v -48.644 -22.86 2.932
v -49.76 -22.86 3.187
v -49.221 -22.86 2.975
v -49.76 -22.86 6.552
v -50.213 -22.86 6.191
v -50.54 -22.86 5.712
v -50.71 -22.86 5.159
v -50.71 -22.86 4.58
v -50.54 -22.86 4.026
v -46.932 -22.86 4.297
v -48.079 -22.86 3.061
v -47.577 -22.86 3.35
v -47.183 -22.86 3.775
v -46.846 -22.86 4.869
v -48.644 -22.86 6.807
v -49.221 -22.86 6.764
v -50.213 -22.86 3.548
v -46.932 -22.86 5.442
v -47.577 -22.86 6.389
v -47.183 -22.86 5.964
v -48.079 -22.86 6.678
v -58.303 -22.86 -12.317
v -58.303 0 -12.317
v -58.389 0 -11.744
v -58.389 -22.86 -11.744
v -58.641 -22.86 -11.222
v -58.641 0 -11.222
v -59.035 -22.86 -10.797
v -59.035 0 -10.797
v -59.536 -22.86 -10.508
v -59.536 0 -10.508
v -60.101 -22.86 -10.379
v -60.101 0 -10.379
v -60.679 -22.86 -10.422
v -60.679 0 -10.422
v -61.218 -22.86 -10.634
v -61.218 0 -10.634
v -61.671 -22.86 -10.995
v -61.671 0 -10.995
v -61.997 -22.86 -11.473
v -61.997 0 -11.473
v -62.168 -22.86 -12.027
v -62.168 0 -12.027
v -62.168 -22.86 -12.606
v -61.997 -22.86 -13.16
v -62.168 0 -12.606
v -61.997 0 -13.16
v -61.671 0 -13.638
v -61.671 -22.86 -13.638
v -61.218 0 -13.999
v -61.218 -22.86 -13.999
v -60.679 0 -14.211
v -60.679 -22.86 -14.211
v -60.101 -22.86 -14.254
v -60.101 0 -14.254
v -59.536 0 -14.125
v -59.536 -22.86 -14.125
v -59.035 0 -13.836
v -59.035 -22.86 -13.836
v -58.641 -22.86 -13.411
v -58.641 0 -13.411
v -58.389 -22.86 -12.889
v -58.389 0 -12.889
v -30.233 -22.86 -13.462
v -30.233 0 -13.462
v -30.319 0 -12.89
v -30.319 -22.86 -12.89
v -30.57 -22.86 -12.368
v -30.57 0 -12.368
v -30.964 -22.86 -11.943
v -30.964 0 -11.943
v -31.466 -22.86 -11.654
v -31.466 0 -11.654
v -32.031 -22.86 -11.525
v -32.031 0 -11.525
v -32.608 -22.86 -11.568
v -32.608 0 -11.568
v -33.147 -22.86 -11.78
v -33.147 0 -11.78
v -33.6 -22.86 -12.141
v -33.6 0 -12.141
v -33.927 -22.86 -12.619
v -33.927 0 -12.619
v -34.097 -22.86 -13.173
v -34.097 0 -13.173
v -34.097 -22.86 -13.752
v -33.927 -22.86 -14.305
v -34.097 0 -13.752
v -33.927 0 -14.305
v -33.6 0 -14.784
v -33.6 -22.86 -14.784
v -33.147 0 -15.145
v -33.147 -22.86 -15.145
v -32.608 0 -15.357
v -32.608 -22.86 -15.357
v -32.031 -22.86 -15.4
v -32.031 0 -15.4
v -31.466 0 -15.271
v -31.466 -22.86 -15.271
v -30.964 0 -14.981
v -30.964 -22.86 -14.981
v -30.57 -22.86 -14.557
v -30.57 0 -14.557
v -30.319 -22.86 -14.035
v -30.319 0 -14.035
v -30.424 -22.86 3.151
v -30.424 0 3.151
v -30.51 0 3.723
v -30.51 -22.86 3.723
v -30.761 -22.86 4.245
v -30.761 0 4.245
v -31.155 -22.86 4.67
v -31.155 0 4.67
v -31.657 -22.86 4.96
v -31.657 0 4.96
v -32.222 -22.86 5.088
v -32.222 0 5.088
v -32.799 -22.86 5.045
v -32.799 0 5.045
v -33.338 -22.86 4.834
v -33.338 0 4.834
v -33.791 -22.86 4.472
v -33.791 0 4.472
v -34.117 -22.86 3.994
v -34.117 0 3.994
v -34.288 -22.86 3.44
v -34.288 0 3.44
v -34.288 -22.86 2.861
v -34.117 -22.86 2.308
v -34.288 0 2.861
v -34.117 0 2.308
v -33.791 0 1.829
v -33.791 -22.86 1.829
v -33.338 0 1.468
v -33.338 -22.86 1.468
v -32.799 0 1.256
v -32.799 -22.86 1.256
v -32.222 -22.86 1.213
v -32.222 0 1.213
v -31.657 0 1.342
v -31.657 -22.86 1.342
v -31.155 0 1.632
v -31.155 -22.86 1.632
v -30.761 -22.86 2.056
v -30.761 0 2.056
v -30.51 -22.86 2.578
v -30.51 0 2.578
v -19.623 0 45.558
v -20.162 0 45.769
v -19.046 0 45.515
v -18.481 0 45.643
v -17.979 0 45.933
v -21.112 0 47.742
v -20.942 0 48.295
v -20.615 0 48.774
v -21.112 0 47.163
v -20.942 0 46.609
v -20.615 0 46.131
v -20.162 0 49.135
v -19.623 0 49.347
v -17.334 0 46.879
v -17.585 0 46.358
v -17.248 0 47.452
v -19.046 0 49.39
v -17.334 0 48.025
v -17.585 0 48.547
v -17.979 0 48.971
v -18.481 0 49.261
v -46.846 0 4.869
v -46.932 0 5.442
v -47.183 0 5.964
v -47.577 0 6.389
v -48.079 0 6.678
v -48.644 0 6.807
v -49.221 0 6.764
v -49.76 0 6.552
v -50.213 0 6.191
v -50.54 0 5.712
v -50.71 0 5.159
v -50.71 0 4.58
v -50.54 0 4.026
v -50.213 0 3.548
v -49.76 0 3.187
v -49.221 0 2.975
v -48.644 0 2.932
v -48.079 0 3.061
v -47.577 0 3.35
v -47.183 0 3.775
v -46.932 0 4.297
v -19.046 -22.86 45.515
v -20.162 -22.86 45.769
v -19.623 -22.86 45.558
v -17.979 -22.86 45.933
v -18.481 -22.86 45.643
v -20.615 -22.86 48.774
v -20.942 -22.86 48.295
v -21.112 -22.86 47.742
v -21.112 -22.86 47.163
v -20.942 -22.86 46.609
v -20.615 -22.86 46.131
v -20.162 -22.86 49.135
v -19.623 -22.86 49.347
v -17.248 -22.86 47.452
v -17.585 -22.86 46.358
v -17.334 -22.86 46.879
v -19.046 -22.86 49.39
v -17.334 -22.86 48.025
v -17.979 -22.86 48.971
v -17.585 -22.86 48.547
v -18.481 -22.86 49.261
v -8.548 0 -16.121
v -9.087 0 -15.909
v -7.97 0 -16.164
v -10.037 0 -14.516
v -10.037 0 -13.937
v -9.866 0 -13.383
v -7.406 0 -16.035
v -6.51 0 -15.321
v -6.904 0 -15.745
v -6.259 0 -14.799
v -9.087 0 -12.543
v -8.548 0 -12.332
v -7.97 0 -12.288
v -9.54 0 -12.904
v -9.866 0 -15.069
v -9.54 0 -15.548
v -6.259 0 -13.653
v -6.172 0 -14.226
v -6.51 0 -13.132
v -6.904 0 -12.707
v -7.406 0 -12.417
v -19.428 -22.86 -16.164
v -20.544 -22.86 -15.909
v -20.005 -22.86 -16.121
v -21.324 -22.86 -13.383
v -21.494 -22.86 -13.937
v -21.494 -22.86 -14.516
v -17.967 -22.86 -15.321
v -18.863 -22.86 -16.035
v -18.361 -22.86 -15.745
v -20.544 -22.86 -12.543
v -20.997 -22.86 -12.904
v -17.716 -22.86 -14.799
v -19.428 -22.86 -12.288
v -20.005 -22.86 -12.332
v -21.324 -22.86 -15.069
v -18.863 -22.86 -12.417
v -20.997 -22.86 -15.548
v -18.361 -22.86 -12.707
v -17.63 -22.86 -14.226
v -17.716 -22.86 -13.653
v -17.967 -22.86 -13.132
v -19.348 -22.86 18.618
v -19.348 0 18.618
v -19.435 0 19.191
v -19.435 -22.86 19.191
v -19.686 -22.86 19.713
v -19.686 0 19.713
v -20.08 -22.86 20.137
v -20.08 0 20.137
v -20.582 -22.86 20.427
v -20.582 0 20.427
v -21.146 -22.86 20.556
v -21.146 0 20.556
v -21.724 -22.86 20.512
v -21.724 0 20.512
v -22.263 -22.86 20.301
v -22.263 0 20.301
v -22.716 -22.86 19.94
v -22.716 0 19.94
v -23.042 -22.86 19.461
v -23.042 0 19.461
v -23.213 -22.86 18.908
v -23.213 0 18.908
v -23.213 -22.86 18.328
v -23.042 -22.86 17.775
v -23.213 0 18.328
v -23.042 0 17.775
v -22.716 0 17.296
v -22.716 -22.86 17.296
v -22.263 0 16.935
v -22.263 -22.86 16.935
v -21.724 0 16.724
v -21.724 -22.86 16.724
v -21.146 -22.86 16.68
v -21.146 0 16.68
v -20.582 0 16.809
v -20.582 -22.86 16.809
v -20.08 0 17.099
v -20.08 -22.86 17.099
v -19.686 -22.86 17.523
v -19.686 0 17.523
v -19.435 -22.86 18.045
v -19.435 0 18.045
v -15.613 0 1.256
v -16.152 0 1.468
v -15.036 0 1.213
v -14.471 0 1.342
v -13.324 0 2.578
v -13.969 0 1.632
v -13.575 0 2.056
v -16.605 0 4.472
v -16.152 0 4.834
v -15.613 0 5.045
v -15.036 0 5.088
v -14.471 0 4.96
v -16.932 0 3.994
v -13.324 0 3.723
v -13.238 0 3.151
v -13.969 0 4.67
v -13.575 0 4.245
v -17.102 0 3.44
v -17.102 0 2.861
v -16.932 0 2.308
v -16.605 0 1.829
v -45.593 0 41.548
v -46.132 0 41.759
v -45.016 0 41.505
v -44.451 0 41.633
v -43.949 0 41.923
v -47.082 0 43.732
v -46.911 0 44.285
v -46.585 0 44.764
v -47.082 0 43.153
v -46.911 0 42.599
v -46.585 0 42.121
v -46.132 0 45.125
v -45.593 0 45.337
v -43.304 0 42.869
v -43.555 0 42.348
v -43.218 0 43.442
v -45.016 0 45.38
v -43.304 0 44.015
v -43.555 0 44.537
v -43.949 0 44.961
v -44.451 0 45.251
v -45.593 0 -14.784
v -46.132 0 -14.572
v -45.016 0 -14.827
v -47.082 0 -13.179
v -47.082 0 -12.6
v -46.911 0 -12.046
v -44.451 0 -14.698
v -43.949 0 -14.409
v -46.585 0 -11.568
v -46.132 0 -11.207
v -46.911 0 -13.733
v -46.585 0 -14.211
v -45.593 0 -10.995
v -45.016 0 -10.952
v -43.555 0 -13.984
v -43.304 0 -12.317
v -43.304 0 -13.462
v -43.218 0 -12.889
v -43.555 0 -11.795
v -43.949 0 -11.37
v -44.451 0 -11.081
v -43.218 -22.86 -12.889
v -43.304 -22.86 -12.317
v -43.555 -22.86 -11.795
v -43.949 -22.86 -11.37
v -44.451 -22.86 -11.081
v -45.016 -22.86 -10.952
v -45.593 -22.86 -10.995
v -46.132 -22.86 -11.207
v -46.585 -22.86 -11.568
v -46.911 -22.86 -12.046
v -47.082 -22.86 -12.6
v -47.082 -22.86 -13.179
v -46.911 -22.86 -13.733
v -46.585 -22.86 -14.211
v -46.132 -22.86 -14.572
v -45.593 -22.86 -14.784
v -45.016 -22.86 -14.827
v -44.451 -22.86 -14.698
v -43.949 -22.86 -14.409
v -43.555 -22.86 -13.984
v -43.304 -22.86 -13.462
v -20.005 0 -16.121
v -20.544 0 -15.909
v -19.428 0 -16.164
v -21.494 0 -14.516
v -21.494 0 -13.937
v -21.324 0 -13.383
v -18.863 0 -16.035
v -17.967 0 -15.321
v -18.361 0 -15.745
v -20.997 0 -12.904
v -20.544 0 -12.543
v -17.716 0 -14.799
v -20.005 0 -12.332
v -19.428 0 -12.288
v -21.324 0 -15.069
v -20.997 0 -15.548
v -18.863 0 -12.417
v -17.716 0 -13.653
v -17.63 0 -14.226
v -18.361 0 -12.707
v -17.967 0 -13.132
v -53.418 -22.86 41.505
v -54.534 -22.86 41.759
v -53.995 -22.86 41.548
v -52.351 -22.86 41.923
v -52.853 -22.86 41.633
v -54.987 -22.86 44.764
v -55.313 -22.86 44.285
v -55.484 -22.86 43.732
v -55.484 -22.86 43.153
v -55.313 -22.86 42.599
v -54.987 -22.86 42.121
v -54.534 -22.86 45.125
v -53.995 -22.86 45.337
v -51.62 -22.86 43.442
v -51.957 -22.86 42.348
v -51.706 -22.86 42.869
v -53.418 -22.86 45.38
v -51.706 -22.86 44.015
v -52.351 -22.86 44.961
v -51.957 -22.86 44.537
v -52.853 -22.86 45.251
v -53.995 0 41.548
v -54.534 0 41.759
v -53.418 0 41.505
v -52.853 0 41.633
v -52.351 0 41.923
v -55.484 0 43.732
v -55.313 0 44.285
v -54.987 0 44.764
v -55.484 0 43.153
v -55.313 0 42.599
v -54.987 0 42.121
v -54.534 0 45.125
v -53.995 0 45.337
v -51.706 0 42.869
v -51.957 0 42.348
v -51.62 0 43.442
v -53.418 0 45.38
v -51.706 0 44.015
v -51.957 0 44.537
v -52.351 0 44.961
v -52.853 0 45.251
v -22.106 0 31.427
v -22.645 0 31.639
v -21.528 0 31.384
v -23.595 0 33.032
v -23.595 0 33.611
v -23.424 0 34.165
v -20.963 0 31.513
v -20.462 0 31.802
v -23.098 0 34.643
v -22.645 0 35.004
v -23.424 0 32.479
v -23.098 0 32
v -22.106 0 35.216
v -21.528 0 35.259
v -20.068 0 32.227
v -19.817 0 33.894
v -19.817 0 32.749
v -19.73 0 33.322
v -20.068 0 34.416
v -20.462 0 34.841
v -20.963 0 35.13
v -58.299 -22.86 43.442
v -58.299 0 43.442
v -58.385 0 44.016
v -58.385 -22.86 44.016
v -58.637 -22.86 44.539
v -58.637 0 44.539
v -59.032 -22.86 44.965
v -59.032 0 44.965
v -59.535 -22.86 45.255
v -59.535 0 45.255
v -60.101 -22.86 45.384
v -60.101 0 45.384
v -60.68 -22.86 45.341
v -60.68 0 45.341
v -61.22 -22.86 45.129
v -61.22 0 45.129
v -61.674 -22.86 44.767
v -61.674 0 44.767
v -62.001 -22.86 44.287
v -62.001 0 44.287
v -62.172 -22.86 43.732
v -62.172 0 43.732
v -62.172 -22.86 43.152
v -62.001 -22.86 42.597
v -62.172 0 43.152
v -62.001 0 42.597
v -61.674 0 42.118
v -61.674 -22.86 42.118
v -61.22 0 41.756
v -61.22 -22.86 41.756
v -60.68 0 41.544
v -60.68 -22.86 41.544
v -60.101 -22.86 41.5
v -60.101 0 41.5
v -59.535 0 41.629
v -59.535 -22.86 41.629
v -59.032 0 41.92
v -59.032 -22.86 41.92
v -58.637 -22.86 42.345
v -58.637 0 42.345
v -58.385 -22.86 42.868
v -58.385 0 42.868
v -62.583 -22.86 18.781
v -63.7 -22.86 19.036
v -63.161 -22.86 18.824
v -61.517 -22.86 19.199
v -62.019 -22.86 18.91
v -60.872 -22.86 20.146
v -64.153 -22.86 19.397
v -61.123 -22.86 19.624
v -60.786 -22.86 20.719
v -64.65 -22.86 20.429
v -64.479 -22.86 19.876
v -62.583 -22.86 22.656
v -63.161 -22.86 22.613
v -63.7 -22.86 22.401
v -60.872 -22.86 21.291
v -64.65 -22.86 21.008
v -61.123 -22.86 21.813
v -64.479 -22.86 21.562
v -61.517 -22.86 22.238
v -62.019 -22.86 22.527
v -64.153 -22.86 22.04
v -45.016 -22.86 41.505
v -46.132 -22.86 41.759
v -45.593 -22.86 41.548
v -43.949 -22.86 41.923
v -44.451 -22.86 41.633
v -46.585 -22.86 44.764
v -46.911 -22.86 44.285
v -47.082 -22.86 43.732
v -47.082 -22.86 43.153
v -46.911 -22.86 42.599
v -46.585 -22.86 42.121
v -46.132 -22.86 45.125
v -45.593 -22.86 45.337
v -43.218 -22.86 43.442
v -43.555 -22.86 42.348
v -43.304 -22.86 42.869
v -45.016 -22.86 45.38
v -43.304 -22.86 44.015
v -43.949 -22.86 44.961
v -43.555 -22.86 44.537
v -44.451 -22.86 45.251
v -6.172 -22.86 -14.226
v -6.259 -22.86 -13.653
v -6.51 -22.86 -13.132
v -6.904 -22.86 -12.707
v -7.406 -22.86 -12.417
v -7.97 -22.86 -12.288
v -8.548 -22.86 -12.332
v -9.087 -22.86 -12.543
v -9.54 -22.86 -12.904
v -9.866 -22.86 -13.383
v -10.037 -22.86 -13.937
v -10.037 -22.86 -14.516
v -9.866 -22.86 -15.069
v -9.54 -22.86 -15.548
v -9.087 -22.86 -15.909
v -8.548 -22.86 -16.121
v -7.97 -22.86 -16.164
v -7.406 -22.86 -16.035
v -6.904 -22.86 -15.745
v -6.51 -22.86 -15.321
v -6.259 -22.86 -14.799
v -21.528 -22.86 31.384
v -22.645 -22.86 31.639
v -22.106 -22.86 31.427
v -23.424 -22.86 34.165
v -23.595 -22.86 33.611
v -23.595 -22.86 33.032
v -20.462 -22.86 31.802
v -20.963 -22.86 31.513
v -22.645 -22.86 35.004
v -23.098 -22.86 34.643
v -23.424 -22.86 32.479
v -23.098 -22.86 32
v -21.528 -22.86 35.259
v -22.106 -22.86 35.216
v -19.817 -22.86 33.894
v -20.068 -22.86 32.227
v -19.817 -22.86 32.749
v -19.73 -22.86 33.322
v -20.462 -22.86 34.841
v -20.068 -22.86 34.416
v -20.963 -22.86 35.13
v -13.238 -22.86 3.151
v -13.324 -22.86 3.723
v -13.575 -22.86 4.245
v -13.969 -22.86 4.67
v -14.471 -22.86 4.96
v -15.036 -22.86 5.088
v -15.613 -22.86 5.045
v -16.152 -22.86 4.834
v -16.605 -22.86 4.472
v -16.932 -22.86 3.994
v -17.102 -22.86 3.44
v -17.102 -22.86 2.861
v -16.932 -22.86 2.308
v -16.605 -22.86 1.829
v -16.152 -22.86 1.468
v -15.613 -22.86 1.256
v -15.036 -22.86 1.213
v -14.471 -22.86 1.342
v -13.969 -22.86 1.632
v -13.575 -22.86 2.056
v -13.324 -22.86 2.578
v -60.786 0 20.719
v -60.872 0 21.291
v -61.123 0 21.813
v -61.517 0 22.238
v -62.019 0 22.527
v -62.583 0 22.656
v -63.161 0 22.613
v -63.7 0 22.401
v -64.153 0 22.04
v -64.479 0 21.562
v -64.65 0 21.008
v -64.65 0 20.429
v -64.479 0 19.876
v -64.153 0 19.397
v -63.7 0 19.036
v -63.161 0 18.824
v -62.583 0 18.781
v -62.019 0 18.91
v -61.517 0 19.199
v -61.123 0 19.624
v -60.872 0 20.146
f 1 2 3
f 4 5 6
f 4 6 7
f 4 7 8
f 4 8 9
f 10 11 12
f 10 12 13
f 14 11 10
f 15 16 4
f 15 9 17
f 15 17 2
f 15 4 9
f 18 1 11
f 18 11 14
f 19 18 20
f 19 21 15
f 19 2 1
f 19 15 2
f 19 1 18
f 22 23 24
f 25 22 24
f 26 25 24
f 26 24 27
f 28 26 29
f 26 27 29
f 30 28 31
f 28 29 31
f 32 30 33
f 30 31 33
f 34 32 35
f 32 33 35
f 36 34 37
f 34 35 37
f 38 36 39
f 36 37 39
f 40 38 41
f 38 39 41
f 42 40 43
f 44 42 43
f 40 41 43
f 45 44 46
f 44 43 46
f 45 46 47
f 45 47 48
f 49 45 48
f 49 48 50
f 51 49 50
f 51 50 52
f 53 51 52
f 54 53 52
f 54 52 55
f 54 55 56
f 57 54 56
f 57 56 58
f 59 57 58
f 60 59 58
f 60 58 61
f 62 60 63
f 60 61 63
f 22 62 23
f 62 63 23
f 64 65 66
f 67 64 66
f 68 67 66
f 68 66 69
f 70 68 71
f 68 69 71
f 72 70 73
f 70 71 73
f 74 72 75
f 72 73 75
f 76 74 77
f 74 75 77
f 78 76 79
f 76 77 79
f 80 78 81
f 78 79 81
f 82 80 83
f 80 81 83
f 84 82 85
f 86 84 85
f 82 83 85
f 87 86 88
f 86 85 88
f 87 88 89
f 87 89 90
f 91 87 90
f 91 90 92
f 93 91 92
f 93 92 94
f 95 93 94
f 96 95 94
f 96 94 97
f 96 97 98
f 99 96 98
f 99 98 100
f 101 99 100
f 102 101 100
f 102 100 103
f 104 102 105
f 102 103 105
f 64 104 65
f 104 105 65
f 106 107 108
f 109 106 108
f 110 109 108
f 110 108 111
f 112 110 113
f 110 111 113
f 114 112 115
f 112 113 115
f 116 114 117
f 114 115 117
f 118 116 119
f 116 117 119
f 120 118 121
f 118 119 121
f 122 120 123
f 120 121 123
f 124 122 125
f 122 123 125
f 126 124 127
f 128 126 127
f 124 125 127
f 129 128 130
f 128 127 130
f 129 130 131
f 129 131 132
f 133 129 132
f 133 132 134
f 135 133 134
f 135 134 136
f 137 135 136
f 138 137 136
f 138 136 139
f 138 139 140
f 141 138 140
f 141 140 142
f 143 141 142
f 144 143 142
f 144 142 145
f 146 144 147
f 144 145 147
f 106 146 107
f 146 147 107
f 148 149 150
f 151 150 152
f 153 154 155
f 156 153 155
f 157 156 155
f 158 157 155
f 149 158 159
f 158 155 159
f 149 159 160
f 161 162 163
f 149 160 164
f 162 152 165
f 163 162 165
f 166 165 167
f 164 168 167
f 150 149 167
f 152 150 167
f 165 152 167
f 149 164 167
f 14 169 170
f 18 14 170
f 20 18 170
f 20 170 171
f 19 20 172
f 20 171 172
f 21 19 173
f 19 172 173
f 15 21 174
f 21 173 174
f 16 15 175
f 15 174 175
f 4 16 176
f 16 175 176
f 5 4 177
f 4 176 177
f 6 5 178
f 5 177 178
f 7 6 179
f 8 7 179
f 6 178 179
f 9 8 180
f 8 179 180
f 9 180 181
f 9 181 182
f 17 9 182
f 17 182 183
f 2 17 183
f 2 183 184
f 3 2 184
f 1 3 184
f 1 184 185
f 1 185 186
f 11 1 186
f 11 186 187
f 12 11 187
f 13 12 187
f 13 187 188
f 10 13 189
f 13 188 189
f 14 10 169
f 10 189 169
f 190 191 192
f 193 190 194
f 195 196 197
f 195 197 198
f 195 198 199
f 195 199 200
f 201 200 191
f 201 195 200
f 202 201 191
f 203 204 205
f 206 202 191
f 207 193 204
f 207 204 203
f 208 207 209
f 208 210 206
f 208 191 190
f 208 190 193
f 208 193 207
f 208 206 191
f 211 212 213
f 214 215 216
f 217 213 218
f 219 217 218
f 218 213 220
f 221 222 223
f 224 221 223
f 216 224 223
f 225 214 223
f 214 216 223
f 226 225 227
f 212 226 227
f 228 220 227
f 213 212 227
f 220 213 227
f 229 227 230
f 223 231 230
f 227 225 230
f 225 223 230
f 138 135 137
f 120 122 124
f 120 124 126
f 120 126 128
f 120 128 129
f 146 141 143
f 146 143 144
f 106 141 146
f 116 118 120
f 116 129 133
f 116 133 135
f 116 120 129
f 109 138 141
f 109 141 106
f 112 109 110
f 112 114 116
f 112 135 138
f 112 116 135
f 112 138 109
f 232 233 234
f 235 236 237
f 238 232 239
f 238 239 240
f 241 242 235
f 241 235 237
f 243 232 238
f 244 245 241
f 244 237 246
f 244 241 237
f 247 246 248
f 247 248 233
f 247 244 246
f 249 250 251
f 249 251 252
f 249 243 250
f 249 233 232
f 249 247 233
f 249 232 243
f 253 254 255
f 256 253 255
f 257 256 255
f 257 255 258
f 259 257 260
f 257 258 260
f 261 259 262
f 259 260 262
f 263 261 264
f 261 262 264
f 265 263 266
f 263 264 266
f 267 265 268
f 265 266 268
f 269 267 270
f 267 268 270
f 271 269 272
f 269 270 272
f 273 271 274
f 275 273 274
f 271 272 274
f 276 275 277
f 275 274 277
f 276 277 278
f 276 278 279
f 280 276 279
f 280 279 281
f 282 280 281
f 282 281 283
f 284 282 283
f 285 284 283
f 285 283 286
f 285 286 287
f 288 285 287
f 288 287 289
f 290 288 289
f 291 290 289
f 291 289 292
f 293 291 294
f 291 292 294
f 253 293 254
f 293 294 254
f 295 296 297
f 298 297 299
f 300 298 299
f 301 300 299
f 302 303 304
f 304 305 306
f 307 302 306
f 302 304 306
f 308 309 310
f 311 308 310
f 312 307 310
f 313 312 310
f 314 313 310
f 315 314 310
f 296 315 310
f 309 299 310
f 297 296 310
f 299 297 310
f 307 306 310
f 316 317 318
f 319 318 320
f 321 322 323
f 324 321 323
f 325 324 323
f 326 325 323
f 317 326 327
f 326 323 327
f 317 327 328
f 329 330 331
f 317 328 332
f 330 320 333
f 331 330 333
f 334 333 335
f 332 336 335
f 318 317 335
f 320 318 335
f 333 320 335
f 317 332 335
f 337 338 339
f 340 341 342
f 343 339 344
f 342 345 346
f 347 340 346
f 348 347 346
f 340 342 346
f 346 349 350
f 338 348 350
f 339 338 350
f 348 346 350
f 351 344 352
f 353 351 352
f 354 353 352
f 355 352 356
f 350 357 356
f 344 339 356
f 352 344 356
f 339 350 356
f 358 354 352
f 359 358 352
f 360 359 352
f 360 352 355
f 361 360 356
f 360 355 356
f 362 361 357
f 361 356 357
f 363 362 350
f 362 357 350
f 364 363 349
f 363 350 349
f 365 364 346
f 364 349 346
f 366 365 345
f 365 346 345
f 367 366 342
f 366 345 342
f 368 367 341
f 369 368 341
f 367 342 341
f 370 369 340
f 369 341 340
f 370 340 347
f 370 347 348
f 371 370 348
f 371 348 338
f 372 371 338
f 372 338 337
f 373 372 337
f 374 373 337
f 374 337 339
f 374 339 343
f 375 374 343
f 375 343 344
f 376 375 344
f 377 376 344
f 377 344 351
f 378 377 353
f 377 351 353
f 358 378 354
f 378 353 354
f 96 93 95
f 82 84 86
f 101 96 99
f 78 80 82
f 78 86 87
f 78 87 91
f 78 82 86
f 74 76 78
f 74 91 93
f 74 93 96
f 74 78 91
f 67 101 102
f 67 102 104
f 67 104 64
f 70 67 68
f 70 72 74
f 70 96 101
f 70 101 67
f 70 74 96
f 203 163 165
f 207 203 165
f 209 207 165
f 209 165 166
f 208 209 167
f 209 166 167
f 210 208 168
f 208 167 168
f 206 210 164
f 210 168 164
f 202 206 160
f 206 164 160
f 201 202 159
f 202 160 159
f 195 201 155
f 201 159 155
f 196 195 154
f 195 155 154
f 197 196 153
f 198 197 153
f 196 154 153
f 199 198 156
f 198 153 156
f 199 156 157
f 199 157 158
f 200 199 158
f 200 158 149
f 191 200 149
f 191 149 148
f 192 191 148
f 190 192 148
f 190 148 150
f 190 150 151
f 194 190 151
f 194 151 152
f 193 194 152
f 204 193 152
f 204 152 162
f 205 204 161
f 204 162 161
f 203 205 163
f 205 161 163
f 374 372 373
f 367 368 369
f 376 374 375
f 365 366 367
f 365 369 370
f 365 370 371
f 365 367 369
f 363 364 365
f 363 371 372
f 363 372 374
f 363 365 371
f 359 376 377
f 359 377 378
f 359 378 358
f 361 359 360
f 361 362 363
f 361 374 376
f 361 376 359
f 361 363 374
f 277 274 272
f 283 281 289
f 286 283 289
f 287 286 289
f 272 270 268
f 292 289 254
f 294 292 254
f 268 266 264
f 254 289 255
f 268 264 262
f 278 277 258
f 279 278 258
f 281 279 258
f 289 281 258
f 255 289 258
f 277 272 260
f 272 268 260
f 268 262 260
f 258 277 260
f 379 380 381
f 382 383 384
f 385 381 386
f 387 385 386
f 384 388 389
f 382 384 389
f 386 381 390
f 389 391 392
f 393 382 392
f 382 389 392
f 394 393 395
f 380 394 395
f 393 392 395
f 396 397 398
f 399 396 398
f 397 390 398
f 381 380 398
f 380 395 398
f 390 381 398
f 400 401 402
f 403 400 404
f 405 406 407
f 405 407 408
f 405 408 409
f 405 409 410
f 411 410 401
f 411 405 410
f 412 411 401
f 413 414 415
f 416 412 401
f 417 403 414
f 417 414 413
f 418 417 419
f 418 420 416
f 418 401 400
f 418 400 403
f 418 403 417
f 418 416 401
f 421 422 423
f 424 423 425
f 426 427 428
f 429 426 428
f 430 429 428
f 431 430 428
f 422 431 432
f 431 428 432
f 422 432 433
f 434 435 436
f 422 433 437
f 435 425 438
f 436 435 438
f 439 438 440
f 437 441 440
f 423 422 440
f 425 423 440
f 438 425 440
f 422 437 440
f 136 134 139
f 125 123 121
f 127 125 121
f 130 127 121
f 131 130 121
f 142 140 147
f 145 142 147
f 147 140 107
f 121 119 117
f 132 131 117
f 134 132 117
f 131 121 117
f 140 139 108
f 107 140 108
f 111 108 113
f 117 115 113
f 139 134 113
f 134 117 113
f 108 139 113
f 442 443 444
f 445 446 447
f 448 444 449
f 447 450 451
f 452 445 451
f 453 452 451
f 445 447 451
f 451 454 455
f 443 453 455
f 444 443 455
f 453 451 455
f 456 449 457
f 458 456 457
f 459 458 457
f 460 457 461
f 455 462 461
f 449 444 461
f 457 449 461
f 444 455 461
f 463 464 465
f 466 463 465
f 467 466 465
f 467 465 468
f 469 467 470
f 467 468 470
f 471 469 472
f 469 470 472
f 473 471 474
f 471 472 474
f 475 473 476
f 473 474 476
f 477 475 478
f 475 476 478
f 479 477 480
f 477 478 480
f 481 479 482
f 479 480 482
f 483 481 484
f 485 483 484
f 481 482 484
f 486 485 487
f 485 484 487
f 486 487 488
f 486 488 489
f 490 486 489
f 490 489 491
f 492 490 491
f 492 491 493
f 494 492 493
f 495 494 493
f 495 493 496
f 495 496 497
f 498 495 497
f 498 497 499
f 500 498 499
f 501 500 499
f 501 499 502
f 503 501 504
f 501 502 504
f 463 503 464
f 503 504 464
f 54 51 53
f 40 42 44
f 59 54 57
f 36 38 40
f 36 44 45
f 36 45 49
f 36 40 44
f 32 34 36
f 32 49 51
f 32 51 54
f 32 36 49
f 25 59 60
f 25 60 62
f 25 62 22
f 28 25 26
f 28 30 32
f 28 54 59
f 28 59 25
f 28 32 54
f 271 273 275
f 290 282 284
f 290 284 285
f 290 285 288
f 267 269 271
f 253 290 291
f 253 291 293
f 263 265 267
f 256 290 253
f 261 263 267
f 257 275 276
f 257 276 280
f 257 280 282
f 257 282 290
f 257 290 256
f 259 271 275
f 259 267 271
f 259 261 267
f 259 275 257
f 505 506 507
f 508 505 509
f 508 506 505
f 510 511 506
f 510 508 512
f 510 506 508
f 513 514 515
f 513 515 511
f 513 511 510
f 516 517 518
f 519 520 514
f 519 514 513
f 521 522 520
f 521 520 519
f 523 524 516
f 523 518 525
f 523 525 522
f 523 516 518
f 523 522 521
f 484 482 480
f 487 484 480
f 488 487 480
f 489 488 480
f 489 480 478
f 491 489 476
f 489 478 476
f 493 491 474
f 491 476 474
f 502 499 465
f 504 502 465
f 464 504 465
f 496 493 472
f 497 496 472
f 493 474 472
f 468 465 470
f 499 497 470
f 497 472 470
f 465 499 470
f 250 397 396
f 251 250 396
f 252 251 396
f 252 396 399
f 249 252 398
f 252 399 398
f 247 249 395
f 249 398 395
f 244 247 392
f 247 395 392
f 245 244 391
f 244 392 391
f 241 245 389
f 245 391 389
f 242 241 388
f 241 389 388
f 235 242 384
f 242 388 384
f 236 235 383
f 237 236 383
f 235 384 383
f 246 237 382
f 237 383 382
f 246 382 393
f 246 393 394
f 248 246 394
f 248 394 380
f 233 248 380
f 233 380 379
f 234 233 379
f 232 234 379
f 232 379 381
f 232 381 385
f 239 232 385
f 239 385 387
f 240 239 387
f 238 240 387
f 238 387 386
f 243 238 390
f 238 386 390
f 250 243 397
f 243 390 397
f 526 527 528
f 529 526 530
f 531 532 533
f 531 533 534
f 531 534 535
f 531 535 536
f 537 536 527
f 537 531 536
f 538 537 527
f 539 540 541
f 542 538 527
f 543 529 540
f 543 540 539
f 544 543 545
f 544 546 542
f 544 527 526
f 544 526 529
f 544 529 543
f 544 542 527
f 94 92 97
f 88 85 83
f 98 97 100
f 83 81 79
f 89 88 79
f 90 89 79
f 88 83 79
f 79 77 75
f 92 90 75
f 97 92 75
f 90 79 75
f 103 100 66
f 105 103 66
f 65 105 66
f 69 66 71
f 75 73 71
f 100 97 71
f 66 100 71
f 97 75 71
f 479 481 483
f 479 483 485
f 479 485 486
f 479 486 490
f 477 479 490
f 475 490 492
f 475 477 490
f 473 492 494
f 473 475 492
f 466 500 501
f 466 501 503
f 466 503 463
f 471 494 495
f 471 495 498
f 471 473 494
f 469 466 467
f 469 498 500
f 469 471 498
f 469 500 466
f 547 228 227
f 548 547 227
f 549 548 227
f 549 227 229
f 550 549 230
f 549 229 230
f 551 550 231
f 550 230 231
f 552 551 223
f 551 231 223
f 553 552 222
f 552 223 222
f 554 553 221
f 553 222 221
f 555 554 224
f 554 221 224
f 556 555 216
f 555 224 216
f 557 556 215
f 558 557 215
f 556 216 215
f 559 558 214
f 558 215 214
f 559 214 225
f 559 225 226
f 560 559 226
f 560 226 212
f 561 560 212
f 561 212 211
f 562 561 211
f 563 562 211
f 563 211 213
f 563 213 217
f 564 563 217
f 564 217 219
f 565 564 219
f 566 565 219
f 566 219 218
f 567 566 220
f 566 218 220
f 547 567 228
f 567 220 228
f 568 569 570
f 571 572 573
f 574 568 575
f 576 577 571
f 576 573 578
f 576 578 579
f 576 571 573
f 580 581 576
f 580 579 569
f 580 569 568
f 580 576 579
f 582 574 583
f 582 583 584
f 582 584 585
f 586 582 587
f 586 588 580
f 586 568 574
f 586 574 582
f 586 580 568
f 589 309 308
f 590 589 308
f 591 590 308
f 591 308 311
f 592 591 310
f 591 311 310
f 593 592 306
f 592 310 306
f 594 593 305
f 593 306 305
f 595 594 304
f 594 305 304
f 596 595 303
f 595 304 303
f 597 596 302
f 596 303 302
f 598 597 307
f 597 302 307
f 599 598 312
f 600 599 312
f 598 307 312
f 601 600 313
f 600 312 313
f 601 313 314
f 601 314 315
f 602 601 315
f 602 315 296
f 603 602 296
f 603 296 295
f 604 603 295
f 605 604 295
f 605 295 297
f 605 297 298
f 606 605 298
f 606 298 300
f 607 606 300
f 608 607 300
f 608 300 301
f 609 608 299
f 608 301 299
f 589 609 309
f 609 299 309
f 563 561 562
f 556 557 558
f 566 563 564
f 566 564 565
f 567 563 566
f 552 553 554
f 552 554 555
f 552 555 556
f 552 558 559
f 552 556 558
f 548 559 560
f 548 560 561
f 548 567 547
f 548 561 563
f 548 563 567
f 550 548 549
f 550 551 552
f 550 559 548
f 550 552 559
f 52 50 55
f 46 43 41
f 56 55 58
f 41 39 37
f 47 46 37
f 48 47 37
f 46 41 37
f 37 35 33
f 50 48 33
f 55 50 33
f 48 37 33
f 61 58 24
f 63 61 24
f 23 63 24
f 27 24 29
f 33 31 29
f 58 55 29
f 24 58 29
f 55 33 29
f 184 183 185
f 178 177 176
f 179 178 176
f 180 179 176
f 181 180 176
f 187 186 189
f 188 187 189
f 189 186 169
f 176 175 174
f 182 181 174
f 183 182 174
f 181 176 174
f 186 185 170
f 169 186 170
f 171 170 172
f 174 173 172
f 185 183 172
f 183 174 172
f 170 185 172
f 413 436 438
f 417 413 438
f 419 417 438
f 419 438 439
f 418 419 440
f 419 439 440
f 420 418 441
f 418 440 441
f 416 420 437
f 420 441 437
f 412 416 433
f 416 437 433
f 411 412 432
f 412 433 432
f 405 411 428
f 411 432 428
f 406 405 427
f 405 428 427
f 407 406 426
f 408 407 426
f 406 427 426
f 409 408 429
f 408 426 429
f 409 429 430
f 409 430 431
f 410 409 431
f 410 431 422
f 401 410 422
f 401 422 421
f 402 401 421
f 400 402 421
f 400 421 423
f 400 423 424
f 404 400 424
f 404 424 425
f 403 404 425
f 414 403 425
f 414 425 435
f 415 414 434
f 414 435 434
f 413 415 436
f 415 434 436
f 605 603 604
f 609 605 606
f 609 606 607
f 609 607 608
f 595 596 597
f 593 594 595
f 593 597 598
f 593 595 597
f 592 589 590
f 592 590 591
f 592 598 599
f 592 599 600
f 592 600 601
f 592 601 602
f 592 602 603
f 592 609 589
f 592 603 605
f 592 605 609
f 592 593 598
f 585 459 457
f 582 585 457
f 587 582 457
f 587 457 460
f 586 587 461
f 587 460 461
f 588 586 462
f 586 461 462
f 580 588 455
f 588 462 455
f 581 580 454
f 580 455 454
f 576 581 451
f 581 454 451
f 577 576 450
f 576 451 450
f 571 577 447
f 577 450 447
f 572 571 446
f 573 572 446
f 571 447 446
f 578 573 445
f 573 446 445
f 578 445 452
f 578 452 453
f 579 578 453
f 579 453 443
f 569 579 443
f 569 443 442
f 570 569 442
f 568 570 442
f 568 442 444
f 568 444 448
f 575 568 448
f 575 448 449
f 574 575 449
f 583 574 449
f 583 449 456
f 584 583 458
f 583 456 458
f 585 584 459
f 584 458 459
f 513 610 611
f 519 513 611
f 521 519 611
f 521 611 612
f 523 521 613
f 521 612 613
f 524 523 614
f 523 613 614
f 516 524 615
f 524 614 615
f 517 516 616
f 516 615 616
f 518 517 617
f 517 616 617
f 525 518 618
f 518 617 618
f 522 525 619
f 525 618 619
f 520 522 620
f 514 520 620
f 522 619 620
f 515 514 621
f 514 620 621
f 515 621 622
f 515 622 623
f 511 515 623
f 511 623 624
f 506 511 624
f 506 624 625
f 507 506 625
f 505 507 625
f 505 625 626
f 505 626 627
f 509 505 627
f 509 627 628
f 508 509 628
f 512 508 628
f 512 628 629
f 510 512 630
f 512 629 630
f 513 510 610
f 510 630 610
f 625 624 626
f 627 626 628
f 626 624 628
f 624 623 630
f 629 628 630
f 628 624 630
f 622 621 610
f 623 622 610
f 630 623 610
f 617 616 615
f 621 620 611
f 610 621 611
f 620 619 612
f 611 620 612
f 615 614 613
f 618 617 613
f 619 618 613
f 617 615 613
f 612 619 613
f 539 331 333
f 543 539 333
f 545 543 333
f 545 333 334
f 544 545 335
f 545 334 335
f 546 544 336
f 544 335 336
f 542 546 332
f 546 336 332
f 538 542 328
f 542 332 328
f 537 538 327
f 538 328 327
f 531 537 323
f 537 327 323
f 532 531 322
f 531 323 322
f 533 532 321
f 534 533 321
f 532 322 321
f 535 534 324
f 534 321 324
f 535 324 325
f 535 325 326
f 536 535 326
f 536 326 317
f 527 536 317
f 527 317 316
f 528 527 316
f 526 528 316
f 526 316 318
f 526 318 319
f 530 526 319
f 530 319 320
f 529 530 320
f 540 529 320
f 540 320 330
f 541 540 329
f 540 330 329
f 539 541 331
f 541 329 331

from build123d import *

# Parameters (mm, degrees)
F0_R     = 1.94736
F0_R_2   = 1.9431
F1_DEPTH = 22.86


with BuildPart() as f1:
    # F0 (on Front) → F1 (new body)
    with BuildSketch(Plane.XZ):
        with Locations((-60.246196, 43.442186)):
            Circle(F0_R)
        with Locations((-53.562783, 43.442186)):
            Circle(F0_R_2)
        with Locations((-45.160774, 43.442186)):
            Circle(F0_R_2)
        with Locations((-62.728606, 20.71858)):
            Circle(F0_R_2)
        with Locations((-21.291444, 18.618079)):
            Circle(F0_R_2)
        with Locations((-21.673353, 33.321589)):
            Circle(F0_R_2)
        with Locations((-19.190943, 47.45223)):
            Circle(F0_R_2)
        with Locations((-48.788916, 4.869344)):
            Circle(F0_R_2)
        with Locations((-32.366812, 3.150752)):
            Circle(F0_R_2)
        with Locations((-15.180895, 3.150752)):
            Circle(F0_R_2)
        with Locations((-60.246196, -12.316575)):
            Circle(F0_R_2)
        with Locations((-45.160774, -12.889439)):
            Circle(F0_R_2)
        with Locations((-32.175858, -13.462303)):
            Circle(F0_R_2)
        with Locations((-19.572852, -14.226122)):
            Circle(F0_R_2)
        with Locations((-8.115573, -14.226122)):
            Circle(F0_R_2)
    extrude(amount=F1_DEPTH)


solid = f1.part
